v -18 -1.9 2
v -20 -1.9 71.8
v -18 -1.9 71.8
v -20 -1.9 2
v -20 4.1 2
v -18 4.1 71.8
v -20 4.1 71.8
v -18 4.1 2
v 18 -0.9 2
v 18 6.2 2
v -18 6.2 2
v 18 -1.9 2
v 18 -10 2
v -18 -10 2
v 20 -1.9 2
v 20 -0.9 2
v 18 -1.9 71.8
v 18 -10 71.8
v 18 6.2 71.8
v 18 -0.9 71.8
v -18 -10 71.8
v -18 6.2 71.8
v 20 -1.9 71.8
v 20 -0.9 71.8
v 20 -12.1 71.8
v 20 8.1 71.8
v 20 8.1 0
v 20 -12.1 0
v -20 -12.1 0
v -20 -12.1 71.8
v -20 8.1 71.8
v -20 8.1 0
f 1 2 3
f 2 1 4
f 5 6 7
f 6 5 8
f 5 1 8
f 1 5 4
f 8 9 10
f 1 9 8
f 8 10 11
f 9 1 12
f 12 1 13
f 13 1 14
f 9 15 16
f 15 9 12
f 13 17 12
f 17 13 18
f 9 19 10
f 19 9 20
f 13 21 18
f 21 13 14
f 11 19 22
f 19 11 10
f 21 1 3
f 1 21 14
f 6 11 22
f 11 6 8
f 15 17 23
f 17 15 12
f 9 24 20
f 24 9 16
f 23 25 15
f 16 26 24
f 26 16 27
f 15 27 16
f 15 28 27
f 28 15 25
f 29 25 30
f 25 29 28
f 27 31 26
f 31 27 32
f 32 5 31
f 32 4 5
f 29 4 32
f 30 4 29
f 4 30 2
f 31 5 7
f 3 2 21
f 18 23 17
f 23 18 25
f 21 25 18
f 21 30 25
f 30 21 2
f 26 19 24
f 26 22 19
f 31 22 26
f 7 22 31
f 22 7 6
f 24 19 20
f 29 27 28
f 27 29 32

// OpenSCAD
/* Customizable PCB or Hard Drive Carry Case
 * Author: Brhubbar - https://www.thingiverse.com/brhubbar/about
 * Date Created: 10/9/2019
 * 
 * This work is licensed under the Creative Commons - Attribution - Non-Commercial - ShareAlike license.
 * https://creativecommons.org/licenses/by-nc-sa/3.0/
 */
 
 
  // Parameters
  
/* [Left Dimensions (mm)] */
// Measure from base to bottom surface to be gripped. (L1+L2+L3 must sum to the same value as R1+R2+R3).
L1 = 7;

// Measure thickness of surface to be gripped.
L2 = 1  ;

// Measure from top of surface to be gripped to tallest component on PCBA.
L3 = 8;


/* [Right Dimensions (mm)] */
// Measure from base to bottom surface to be gripped.
R1 = 2;

// Measure thickness of surface to be gripped.
R2 = 6;

// Measure from top of surface to be gripped to tallest component on PCBA.
R3 = 8;


/* [Other Dimensions] */
// PCB Width [mm] (open face width).
width = 40;

// PCB Length [mm] (clamped dimension).
length = 70;

// shell_thickness Thickness [mm].
shell_thickness = 2;

// tolerance [mm].
tolerance = 0.2;

// preview[view:north east, tilt:top diagonal]

  // Build
  
CustomCase(L1, L2, L3, R1, R2, R3, width, length, shell_thickness, tolerance);
  // Modules
  
module CustomCase(L1, L2, L3, R1, R2, R3, width, length, shell_thickness, tolerance) {
  assert(R1 + R2 + R3 == L1 + L2 + L3, "Error: Sum of Left Dimensions must equal Sum of Right Dimensions");
  
  height = R1 + R2 + R3 + tolerance;
  
  translate([-width/2, height/2, 0])rotate([90, 0, 0]){
    difference(){
      Case_Body(width, length, height, shell_thickness, tolerance);
      PCB(L1, L2, R1, R2, width, length, height, shell_thickness, tolerance);
    }
  }
}

module PCB(L1, L2, R1, R2, width, length, height, shell_thickness, tolerance) { 
  // Build the right part of the PCB with a toleranceerance to ensure the difference completely removes the surface. No toleranceerance is applied to the thickness of the PCB (want a good friction fit).
  rightOrigin = [0-tolerance/2, shell_thickness, shell_thickness + R1];
  rightDim = [shell_thickness+tolerance, length, R2];
  translate(rightOrigin)cube(rightDim);
  
  // Build the bulk of the PCB with a toleranceerance on the total height (extra clearance).
  middleOrigin = [shell_thickness, shell_thickness, shell_thickness-tolerance/2];
  middleDim = [width - 2*shell_thickness, length, height];
  translate(middleOrigin)cube(middleDim);
  
  // Build the left part of the PCB with a tolerance on the width, but not the thickness/height (same as right side).
  leftOrigin = [width - shell_thickness - tolerance/2, shell_thickness, shell_thickness + L1];
  leftDim = [shell_thickness+tolerance, length, L2];
  translate(leftOrigin)cube(leftDim);
}

module Case_Body(width, length, height, shell, tolerance) {
  union(){
    caseOrigin = [0, 0, 0];
    caseDim = [width, length + shell - tolerance, height + 2*shell];
    translate(caseOrigin)cube(caseDim);
  }
}
